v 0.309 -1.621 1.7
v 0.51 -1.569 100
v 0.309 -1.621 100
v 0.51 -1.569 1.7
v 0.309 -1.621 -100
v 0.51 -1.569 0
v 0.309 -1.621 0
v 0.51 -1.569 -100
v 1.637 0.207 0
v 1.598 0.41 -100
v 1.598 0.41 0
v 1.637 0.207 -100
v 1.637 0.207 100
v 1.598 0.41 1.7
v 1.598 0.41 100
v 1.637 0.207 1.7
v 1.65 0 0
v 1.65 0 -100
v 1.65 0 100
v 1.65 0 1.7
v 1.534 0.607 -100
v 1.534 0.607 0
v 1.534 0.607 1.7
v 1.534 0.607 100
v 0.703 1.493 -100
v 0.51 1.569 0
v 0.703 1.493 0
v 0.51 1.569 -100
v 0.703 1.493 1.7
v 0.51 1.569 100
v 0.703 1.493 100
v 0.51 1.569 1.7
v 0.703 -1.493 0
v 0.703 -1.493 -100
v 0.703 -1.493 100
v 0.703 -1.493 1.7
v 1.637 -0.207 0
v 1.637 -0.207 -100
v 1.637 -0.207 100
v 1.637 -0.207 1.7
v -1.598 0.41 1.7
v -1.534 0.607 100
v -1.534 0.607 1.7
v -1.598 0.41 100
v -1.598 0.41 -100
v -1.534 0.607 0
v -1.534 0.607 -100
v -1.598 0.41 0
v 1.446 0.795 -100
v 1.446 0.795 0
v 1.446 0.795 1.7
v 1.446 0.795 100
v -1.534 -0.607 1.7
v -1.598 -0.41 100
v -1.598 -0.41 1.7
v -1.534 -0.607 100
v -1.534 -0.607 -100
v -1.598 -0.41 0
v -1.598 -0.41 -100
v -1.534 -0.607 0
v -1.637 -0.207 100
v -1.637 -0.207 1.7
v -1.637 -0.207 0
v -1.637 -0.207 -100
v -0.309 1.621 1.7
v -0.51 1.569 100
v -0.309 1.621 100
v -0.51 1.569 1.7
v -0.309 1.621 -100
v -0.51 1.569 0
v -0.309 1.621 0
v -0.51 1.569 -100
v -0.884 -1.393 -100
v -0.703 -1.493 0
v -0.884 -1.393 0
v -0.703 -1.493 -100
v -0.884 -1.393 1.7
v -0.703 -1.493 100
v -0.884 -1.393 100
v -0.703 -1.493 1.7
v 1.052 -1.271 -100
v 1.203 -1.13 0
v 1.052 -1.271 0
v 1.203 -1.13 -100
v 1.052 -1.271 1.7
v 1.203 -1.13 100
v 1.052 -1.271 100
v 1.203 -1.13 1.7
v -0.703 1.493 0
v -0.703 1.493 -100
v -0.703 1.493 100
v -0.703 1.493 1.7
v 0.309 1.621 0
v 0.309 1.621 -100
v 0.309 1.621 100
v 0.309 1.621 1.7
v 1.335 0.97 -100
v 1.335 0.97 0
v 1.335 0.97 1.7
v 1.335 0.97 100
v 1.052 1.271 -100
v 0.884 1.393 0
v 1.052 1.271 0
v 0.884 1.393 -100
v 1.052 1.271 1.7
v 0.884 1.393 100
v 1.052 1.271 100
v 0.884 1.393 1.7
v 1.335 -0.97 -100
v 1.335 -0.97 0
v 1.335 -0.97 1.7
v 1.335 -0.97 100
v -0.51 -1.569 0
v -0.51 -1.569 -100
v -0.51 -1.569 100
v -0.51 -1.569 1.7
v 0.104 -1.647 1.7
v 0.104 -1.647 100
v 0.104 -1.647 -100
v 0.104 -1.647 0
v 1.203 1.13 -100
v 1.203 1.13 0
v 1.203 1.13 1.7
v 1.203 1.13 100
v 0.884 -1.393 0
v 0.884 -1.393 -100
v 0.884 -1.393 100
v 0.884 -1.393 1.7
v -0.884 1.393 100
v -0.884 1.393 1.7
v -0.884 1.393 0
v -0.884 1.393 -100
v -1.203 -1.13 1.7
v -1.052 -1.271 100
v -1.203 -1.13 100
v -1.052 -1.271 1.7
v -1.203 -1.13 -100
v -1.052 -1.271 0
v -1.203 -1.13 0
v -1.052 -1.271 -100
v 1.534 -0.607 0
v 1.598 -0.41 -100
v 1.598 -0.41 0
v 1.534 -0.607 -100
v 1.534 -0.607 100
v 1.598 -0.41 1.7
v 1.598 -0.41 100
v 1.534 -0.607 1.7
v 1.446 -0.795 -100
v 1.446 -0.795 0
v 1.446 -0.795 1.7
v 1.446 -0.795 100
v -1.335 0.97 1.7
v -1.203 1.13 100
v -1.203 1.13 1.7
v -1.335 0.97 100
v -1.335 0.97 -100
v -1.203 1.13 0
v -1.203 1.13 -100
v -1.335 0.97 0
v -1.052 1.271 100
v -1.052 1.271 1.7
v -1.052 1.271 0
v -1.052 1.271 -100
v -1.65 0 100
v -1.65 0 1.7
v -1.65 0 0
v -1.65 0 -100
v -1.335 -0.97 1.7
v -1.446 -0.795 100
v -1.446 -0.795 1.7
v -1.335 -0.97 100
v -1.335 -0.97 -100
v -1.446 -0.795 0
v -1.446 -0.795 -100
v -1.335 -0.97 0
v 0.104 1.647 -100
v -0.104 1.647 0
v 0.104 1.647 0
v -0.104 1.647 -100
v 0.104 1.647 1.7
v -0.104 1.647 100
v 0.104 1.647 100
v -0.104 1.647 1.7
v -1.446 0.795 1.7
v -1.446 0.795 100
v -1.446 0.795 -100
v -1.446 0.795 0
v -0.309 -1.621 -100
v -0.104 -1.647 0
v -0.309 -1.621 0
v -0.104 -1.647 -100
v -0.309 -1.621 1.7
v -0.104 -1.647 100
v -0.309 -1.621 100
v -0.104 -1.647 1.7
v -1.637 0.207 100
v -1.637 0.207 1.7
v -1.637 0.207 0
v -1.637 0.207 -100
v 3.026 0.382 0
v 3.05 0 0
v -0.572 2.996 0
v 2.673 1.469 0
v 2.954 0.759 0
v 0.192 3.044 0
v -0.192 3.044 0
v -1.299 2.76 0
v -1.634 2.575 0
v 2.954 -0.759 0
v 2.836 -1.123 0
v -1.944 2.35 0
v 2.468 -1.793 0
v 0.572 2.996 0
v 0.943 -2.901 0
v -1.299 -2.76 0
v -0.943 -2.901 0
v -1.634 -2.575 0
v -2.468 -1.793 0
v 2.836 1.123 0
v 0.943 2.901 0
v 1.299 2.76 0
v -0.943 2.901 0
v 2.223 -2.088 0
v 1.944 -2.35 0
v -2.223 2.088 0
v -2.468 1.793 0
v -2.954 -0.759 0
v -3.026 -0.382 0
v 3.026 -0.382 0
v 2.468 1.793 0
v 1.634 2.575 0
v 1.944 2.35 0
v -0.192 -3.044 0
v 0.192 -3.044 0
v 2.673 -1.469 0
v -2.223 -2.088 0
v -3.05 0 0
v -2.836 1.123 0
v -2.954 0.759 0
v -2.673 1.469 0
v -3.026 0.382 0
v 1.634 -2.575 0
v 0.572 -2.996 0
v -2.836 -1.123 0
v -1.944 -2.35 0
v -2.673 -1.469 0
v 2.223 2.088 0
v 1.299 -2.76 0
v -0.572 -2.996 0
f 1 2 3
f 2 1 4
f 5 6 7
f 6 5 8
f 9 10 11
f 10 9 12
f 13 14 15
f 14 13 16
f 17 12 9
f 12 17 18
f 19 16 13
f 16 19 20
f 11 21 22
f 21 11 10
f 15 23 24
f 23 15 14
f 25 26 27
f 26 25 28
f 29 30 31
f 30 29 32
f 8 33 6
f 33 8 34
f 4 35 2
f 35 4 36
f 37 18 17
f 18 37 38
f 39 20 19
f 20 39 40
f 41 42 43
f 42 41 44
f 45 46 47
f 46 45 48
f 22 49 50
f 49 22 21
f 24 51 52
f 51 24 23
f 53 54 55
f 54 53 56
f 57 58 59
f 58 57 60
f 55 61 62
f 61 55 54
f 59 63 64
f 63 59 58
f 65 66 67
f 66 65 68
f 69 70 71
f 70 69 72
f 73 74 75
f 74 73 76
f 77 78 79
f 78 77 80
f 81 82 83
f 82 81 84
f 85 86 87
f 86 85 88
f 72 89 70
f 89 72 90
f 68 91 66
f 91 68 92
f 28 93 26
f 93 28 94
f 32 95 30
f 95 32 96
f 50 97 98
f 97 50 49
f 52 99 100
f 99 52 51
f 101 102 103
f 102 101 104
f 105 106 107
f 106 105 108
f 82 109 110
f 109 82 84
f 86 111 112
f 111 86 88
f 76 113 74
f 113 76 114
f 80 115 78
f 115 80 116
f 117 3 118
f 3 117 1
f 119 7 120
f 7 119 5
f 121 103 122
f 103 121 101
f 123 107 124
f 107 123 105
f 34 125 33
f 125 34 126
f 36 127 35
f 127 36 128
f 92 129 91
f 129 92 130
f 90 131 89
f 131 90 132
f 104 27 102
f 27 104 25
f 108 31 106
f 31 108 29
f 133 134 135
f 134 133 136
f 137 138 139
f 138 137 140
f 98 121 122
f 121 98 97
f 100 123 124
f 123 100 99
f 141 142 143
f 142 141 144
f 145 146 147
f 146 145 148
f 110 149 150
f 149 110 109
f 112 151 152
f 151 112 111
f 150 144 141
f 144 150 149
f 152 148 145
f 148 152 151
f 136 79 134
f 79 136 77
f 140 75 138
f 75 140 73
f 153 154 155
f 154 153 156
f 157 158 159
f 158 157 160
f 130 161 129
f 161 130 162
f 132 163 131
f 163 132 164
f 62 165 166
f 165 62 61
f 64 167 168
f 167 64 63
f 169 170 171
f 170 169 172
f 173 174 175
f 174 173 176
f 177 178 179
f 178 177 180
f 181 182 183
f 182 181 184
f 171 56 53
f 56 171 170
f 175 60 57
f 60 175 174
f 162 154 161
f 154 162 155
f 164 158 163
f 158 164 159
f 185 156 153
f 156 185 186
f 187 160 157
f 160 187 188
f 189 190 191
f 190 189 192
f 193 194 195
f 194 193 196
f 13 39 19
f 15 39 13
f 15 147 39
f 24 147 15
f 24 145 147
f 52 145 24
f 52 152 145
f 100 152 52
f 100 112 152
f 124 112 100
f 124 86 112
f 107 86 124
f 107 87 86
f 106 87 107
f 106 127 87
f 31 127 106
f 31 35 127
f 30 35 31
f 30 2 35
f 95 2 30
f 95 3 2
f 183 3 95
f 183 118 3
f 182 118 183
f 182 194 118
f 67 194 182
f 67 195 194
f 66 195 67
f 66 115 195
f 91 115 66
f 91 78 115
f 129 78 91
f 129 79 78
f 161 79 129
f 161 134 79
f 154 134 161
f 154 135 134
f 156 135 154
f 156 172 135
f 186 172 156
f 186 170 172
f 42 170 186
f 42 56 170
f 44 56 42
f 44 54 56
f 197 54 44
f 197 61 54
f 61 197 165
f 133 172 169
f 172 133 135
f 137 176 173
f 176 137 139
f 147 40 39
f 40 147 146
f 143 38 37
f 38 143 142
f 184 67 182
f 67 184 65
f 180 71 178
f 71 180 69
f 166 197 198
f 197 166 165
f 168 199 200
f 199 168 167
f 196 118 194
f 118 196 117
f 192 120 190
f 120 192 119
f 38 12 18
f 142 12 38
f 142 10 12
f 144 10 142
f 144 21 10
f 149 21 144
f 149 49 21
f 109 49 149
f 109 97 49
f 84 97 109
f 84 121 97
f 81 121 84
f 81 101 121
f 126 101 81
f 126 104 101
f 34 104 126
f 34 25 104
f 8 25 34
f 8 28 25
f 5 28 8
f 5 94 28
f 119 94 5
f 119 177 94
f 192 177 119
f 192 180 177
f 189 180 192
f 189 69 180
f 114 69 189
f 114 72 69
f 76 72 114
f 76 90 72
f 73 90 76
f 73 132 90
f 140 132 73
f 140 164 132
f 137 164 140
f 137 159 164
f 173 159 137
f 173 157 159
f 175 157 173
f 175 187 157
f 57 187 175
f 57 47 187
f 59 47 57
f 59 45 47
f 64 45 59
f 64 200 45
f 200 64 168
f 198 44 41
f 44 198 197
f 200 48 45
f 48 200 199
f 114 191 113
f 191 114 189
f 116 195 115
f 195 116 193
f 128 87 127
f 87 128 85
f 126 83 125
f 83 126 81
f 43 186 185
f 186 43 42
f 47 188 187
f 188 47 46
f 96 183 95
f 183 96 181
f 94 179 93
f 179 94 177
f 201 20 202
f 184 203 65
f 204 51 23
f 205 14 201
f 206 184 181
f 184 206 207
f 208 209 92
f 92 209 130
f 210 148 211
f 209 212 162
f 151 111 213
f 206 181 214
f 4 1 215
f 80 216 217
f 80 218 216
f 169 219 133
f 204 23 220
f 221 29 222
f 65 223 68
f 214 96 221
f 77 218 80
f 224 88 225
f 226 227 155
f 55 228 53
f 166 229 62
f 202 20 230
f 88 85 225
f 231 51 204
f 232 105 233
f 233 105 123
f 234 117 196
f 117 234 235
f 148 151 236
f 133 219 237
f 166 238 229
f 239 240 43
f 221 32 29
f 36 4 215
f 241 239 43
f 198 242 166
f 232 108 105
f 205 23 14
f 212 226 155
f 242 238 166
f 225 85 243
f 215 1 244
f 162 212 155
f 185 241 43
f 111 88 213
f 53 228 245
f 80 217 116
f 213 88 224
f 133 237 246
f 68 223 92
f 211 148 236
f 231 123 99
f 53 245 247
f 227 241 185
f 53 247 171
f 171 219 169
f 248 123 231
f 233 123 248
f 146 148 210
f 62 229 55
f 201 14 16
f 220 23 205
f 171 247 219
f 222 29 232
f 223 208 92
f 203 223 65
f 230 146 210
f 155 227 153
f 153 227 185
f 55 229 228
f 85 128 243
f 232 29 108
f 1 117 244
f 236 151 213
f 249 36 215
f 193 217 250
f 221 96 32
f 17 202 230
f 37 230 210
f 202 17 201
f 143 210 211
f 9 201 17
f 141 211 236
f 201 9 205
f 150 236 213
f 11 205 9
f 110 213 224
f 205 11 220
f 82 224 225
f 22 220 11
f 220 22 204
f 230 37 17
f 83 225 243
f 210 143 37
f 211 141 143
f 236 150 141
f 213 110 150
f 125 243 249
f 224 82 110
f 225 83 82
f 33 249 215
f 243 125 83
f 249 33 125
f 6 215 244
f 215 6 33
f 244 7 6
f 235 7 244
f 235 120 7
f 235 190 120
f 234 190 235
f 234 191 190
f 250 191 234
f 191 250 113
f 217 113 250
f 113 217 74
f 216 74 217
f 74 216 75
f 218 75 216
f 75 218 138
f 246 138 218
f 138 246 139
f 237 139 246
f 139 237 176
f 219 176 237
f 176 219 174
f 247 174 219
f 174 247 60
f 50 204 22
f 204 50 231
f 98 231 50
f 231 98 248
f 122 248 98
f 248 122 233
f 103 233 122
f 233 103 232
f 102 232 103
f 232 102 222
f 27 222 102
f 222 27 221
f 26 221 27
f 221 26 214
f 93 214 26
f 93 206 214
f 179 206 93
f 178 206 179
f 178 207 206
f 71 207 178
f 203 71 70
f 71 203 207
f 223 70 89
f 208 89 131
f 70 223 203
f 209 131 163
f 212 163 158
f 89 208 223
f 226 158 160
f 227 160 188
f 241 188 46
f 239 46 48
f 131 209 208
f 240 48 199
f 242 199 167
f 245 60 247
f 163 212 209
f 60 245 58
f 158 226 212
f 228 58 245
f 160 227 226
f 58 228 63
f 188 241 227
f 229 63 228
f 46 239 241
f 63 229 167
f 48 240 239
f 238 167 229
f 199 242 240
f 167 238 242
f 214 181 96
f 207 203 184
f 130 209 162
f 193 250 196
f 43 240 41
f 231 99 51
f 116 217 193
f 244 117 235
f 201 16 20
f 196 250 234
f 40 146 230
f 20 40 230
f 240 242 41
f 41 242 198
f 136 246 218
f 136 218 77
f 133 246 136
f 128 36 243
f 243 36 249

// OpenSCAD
$fn = 50;difference() {
	union() {
		union() {
			translate(v = [0, 0, -100]) {
				cylinder(h = 200, r = 1.65);
			}
			cylinder(h = 1.7, r1 = 3.05, r2 = 1.65);
		}
	}
	union();
}
